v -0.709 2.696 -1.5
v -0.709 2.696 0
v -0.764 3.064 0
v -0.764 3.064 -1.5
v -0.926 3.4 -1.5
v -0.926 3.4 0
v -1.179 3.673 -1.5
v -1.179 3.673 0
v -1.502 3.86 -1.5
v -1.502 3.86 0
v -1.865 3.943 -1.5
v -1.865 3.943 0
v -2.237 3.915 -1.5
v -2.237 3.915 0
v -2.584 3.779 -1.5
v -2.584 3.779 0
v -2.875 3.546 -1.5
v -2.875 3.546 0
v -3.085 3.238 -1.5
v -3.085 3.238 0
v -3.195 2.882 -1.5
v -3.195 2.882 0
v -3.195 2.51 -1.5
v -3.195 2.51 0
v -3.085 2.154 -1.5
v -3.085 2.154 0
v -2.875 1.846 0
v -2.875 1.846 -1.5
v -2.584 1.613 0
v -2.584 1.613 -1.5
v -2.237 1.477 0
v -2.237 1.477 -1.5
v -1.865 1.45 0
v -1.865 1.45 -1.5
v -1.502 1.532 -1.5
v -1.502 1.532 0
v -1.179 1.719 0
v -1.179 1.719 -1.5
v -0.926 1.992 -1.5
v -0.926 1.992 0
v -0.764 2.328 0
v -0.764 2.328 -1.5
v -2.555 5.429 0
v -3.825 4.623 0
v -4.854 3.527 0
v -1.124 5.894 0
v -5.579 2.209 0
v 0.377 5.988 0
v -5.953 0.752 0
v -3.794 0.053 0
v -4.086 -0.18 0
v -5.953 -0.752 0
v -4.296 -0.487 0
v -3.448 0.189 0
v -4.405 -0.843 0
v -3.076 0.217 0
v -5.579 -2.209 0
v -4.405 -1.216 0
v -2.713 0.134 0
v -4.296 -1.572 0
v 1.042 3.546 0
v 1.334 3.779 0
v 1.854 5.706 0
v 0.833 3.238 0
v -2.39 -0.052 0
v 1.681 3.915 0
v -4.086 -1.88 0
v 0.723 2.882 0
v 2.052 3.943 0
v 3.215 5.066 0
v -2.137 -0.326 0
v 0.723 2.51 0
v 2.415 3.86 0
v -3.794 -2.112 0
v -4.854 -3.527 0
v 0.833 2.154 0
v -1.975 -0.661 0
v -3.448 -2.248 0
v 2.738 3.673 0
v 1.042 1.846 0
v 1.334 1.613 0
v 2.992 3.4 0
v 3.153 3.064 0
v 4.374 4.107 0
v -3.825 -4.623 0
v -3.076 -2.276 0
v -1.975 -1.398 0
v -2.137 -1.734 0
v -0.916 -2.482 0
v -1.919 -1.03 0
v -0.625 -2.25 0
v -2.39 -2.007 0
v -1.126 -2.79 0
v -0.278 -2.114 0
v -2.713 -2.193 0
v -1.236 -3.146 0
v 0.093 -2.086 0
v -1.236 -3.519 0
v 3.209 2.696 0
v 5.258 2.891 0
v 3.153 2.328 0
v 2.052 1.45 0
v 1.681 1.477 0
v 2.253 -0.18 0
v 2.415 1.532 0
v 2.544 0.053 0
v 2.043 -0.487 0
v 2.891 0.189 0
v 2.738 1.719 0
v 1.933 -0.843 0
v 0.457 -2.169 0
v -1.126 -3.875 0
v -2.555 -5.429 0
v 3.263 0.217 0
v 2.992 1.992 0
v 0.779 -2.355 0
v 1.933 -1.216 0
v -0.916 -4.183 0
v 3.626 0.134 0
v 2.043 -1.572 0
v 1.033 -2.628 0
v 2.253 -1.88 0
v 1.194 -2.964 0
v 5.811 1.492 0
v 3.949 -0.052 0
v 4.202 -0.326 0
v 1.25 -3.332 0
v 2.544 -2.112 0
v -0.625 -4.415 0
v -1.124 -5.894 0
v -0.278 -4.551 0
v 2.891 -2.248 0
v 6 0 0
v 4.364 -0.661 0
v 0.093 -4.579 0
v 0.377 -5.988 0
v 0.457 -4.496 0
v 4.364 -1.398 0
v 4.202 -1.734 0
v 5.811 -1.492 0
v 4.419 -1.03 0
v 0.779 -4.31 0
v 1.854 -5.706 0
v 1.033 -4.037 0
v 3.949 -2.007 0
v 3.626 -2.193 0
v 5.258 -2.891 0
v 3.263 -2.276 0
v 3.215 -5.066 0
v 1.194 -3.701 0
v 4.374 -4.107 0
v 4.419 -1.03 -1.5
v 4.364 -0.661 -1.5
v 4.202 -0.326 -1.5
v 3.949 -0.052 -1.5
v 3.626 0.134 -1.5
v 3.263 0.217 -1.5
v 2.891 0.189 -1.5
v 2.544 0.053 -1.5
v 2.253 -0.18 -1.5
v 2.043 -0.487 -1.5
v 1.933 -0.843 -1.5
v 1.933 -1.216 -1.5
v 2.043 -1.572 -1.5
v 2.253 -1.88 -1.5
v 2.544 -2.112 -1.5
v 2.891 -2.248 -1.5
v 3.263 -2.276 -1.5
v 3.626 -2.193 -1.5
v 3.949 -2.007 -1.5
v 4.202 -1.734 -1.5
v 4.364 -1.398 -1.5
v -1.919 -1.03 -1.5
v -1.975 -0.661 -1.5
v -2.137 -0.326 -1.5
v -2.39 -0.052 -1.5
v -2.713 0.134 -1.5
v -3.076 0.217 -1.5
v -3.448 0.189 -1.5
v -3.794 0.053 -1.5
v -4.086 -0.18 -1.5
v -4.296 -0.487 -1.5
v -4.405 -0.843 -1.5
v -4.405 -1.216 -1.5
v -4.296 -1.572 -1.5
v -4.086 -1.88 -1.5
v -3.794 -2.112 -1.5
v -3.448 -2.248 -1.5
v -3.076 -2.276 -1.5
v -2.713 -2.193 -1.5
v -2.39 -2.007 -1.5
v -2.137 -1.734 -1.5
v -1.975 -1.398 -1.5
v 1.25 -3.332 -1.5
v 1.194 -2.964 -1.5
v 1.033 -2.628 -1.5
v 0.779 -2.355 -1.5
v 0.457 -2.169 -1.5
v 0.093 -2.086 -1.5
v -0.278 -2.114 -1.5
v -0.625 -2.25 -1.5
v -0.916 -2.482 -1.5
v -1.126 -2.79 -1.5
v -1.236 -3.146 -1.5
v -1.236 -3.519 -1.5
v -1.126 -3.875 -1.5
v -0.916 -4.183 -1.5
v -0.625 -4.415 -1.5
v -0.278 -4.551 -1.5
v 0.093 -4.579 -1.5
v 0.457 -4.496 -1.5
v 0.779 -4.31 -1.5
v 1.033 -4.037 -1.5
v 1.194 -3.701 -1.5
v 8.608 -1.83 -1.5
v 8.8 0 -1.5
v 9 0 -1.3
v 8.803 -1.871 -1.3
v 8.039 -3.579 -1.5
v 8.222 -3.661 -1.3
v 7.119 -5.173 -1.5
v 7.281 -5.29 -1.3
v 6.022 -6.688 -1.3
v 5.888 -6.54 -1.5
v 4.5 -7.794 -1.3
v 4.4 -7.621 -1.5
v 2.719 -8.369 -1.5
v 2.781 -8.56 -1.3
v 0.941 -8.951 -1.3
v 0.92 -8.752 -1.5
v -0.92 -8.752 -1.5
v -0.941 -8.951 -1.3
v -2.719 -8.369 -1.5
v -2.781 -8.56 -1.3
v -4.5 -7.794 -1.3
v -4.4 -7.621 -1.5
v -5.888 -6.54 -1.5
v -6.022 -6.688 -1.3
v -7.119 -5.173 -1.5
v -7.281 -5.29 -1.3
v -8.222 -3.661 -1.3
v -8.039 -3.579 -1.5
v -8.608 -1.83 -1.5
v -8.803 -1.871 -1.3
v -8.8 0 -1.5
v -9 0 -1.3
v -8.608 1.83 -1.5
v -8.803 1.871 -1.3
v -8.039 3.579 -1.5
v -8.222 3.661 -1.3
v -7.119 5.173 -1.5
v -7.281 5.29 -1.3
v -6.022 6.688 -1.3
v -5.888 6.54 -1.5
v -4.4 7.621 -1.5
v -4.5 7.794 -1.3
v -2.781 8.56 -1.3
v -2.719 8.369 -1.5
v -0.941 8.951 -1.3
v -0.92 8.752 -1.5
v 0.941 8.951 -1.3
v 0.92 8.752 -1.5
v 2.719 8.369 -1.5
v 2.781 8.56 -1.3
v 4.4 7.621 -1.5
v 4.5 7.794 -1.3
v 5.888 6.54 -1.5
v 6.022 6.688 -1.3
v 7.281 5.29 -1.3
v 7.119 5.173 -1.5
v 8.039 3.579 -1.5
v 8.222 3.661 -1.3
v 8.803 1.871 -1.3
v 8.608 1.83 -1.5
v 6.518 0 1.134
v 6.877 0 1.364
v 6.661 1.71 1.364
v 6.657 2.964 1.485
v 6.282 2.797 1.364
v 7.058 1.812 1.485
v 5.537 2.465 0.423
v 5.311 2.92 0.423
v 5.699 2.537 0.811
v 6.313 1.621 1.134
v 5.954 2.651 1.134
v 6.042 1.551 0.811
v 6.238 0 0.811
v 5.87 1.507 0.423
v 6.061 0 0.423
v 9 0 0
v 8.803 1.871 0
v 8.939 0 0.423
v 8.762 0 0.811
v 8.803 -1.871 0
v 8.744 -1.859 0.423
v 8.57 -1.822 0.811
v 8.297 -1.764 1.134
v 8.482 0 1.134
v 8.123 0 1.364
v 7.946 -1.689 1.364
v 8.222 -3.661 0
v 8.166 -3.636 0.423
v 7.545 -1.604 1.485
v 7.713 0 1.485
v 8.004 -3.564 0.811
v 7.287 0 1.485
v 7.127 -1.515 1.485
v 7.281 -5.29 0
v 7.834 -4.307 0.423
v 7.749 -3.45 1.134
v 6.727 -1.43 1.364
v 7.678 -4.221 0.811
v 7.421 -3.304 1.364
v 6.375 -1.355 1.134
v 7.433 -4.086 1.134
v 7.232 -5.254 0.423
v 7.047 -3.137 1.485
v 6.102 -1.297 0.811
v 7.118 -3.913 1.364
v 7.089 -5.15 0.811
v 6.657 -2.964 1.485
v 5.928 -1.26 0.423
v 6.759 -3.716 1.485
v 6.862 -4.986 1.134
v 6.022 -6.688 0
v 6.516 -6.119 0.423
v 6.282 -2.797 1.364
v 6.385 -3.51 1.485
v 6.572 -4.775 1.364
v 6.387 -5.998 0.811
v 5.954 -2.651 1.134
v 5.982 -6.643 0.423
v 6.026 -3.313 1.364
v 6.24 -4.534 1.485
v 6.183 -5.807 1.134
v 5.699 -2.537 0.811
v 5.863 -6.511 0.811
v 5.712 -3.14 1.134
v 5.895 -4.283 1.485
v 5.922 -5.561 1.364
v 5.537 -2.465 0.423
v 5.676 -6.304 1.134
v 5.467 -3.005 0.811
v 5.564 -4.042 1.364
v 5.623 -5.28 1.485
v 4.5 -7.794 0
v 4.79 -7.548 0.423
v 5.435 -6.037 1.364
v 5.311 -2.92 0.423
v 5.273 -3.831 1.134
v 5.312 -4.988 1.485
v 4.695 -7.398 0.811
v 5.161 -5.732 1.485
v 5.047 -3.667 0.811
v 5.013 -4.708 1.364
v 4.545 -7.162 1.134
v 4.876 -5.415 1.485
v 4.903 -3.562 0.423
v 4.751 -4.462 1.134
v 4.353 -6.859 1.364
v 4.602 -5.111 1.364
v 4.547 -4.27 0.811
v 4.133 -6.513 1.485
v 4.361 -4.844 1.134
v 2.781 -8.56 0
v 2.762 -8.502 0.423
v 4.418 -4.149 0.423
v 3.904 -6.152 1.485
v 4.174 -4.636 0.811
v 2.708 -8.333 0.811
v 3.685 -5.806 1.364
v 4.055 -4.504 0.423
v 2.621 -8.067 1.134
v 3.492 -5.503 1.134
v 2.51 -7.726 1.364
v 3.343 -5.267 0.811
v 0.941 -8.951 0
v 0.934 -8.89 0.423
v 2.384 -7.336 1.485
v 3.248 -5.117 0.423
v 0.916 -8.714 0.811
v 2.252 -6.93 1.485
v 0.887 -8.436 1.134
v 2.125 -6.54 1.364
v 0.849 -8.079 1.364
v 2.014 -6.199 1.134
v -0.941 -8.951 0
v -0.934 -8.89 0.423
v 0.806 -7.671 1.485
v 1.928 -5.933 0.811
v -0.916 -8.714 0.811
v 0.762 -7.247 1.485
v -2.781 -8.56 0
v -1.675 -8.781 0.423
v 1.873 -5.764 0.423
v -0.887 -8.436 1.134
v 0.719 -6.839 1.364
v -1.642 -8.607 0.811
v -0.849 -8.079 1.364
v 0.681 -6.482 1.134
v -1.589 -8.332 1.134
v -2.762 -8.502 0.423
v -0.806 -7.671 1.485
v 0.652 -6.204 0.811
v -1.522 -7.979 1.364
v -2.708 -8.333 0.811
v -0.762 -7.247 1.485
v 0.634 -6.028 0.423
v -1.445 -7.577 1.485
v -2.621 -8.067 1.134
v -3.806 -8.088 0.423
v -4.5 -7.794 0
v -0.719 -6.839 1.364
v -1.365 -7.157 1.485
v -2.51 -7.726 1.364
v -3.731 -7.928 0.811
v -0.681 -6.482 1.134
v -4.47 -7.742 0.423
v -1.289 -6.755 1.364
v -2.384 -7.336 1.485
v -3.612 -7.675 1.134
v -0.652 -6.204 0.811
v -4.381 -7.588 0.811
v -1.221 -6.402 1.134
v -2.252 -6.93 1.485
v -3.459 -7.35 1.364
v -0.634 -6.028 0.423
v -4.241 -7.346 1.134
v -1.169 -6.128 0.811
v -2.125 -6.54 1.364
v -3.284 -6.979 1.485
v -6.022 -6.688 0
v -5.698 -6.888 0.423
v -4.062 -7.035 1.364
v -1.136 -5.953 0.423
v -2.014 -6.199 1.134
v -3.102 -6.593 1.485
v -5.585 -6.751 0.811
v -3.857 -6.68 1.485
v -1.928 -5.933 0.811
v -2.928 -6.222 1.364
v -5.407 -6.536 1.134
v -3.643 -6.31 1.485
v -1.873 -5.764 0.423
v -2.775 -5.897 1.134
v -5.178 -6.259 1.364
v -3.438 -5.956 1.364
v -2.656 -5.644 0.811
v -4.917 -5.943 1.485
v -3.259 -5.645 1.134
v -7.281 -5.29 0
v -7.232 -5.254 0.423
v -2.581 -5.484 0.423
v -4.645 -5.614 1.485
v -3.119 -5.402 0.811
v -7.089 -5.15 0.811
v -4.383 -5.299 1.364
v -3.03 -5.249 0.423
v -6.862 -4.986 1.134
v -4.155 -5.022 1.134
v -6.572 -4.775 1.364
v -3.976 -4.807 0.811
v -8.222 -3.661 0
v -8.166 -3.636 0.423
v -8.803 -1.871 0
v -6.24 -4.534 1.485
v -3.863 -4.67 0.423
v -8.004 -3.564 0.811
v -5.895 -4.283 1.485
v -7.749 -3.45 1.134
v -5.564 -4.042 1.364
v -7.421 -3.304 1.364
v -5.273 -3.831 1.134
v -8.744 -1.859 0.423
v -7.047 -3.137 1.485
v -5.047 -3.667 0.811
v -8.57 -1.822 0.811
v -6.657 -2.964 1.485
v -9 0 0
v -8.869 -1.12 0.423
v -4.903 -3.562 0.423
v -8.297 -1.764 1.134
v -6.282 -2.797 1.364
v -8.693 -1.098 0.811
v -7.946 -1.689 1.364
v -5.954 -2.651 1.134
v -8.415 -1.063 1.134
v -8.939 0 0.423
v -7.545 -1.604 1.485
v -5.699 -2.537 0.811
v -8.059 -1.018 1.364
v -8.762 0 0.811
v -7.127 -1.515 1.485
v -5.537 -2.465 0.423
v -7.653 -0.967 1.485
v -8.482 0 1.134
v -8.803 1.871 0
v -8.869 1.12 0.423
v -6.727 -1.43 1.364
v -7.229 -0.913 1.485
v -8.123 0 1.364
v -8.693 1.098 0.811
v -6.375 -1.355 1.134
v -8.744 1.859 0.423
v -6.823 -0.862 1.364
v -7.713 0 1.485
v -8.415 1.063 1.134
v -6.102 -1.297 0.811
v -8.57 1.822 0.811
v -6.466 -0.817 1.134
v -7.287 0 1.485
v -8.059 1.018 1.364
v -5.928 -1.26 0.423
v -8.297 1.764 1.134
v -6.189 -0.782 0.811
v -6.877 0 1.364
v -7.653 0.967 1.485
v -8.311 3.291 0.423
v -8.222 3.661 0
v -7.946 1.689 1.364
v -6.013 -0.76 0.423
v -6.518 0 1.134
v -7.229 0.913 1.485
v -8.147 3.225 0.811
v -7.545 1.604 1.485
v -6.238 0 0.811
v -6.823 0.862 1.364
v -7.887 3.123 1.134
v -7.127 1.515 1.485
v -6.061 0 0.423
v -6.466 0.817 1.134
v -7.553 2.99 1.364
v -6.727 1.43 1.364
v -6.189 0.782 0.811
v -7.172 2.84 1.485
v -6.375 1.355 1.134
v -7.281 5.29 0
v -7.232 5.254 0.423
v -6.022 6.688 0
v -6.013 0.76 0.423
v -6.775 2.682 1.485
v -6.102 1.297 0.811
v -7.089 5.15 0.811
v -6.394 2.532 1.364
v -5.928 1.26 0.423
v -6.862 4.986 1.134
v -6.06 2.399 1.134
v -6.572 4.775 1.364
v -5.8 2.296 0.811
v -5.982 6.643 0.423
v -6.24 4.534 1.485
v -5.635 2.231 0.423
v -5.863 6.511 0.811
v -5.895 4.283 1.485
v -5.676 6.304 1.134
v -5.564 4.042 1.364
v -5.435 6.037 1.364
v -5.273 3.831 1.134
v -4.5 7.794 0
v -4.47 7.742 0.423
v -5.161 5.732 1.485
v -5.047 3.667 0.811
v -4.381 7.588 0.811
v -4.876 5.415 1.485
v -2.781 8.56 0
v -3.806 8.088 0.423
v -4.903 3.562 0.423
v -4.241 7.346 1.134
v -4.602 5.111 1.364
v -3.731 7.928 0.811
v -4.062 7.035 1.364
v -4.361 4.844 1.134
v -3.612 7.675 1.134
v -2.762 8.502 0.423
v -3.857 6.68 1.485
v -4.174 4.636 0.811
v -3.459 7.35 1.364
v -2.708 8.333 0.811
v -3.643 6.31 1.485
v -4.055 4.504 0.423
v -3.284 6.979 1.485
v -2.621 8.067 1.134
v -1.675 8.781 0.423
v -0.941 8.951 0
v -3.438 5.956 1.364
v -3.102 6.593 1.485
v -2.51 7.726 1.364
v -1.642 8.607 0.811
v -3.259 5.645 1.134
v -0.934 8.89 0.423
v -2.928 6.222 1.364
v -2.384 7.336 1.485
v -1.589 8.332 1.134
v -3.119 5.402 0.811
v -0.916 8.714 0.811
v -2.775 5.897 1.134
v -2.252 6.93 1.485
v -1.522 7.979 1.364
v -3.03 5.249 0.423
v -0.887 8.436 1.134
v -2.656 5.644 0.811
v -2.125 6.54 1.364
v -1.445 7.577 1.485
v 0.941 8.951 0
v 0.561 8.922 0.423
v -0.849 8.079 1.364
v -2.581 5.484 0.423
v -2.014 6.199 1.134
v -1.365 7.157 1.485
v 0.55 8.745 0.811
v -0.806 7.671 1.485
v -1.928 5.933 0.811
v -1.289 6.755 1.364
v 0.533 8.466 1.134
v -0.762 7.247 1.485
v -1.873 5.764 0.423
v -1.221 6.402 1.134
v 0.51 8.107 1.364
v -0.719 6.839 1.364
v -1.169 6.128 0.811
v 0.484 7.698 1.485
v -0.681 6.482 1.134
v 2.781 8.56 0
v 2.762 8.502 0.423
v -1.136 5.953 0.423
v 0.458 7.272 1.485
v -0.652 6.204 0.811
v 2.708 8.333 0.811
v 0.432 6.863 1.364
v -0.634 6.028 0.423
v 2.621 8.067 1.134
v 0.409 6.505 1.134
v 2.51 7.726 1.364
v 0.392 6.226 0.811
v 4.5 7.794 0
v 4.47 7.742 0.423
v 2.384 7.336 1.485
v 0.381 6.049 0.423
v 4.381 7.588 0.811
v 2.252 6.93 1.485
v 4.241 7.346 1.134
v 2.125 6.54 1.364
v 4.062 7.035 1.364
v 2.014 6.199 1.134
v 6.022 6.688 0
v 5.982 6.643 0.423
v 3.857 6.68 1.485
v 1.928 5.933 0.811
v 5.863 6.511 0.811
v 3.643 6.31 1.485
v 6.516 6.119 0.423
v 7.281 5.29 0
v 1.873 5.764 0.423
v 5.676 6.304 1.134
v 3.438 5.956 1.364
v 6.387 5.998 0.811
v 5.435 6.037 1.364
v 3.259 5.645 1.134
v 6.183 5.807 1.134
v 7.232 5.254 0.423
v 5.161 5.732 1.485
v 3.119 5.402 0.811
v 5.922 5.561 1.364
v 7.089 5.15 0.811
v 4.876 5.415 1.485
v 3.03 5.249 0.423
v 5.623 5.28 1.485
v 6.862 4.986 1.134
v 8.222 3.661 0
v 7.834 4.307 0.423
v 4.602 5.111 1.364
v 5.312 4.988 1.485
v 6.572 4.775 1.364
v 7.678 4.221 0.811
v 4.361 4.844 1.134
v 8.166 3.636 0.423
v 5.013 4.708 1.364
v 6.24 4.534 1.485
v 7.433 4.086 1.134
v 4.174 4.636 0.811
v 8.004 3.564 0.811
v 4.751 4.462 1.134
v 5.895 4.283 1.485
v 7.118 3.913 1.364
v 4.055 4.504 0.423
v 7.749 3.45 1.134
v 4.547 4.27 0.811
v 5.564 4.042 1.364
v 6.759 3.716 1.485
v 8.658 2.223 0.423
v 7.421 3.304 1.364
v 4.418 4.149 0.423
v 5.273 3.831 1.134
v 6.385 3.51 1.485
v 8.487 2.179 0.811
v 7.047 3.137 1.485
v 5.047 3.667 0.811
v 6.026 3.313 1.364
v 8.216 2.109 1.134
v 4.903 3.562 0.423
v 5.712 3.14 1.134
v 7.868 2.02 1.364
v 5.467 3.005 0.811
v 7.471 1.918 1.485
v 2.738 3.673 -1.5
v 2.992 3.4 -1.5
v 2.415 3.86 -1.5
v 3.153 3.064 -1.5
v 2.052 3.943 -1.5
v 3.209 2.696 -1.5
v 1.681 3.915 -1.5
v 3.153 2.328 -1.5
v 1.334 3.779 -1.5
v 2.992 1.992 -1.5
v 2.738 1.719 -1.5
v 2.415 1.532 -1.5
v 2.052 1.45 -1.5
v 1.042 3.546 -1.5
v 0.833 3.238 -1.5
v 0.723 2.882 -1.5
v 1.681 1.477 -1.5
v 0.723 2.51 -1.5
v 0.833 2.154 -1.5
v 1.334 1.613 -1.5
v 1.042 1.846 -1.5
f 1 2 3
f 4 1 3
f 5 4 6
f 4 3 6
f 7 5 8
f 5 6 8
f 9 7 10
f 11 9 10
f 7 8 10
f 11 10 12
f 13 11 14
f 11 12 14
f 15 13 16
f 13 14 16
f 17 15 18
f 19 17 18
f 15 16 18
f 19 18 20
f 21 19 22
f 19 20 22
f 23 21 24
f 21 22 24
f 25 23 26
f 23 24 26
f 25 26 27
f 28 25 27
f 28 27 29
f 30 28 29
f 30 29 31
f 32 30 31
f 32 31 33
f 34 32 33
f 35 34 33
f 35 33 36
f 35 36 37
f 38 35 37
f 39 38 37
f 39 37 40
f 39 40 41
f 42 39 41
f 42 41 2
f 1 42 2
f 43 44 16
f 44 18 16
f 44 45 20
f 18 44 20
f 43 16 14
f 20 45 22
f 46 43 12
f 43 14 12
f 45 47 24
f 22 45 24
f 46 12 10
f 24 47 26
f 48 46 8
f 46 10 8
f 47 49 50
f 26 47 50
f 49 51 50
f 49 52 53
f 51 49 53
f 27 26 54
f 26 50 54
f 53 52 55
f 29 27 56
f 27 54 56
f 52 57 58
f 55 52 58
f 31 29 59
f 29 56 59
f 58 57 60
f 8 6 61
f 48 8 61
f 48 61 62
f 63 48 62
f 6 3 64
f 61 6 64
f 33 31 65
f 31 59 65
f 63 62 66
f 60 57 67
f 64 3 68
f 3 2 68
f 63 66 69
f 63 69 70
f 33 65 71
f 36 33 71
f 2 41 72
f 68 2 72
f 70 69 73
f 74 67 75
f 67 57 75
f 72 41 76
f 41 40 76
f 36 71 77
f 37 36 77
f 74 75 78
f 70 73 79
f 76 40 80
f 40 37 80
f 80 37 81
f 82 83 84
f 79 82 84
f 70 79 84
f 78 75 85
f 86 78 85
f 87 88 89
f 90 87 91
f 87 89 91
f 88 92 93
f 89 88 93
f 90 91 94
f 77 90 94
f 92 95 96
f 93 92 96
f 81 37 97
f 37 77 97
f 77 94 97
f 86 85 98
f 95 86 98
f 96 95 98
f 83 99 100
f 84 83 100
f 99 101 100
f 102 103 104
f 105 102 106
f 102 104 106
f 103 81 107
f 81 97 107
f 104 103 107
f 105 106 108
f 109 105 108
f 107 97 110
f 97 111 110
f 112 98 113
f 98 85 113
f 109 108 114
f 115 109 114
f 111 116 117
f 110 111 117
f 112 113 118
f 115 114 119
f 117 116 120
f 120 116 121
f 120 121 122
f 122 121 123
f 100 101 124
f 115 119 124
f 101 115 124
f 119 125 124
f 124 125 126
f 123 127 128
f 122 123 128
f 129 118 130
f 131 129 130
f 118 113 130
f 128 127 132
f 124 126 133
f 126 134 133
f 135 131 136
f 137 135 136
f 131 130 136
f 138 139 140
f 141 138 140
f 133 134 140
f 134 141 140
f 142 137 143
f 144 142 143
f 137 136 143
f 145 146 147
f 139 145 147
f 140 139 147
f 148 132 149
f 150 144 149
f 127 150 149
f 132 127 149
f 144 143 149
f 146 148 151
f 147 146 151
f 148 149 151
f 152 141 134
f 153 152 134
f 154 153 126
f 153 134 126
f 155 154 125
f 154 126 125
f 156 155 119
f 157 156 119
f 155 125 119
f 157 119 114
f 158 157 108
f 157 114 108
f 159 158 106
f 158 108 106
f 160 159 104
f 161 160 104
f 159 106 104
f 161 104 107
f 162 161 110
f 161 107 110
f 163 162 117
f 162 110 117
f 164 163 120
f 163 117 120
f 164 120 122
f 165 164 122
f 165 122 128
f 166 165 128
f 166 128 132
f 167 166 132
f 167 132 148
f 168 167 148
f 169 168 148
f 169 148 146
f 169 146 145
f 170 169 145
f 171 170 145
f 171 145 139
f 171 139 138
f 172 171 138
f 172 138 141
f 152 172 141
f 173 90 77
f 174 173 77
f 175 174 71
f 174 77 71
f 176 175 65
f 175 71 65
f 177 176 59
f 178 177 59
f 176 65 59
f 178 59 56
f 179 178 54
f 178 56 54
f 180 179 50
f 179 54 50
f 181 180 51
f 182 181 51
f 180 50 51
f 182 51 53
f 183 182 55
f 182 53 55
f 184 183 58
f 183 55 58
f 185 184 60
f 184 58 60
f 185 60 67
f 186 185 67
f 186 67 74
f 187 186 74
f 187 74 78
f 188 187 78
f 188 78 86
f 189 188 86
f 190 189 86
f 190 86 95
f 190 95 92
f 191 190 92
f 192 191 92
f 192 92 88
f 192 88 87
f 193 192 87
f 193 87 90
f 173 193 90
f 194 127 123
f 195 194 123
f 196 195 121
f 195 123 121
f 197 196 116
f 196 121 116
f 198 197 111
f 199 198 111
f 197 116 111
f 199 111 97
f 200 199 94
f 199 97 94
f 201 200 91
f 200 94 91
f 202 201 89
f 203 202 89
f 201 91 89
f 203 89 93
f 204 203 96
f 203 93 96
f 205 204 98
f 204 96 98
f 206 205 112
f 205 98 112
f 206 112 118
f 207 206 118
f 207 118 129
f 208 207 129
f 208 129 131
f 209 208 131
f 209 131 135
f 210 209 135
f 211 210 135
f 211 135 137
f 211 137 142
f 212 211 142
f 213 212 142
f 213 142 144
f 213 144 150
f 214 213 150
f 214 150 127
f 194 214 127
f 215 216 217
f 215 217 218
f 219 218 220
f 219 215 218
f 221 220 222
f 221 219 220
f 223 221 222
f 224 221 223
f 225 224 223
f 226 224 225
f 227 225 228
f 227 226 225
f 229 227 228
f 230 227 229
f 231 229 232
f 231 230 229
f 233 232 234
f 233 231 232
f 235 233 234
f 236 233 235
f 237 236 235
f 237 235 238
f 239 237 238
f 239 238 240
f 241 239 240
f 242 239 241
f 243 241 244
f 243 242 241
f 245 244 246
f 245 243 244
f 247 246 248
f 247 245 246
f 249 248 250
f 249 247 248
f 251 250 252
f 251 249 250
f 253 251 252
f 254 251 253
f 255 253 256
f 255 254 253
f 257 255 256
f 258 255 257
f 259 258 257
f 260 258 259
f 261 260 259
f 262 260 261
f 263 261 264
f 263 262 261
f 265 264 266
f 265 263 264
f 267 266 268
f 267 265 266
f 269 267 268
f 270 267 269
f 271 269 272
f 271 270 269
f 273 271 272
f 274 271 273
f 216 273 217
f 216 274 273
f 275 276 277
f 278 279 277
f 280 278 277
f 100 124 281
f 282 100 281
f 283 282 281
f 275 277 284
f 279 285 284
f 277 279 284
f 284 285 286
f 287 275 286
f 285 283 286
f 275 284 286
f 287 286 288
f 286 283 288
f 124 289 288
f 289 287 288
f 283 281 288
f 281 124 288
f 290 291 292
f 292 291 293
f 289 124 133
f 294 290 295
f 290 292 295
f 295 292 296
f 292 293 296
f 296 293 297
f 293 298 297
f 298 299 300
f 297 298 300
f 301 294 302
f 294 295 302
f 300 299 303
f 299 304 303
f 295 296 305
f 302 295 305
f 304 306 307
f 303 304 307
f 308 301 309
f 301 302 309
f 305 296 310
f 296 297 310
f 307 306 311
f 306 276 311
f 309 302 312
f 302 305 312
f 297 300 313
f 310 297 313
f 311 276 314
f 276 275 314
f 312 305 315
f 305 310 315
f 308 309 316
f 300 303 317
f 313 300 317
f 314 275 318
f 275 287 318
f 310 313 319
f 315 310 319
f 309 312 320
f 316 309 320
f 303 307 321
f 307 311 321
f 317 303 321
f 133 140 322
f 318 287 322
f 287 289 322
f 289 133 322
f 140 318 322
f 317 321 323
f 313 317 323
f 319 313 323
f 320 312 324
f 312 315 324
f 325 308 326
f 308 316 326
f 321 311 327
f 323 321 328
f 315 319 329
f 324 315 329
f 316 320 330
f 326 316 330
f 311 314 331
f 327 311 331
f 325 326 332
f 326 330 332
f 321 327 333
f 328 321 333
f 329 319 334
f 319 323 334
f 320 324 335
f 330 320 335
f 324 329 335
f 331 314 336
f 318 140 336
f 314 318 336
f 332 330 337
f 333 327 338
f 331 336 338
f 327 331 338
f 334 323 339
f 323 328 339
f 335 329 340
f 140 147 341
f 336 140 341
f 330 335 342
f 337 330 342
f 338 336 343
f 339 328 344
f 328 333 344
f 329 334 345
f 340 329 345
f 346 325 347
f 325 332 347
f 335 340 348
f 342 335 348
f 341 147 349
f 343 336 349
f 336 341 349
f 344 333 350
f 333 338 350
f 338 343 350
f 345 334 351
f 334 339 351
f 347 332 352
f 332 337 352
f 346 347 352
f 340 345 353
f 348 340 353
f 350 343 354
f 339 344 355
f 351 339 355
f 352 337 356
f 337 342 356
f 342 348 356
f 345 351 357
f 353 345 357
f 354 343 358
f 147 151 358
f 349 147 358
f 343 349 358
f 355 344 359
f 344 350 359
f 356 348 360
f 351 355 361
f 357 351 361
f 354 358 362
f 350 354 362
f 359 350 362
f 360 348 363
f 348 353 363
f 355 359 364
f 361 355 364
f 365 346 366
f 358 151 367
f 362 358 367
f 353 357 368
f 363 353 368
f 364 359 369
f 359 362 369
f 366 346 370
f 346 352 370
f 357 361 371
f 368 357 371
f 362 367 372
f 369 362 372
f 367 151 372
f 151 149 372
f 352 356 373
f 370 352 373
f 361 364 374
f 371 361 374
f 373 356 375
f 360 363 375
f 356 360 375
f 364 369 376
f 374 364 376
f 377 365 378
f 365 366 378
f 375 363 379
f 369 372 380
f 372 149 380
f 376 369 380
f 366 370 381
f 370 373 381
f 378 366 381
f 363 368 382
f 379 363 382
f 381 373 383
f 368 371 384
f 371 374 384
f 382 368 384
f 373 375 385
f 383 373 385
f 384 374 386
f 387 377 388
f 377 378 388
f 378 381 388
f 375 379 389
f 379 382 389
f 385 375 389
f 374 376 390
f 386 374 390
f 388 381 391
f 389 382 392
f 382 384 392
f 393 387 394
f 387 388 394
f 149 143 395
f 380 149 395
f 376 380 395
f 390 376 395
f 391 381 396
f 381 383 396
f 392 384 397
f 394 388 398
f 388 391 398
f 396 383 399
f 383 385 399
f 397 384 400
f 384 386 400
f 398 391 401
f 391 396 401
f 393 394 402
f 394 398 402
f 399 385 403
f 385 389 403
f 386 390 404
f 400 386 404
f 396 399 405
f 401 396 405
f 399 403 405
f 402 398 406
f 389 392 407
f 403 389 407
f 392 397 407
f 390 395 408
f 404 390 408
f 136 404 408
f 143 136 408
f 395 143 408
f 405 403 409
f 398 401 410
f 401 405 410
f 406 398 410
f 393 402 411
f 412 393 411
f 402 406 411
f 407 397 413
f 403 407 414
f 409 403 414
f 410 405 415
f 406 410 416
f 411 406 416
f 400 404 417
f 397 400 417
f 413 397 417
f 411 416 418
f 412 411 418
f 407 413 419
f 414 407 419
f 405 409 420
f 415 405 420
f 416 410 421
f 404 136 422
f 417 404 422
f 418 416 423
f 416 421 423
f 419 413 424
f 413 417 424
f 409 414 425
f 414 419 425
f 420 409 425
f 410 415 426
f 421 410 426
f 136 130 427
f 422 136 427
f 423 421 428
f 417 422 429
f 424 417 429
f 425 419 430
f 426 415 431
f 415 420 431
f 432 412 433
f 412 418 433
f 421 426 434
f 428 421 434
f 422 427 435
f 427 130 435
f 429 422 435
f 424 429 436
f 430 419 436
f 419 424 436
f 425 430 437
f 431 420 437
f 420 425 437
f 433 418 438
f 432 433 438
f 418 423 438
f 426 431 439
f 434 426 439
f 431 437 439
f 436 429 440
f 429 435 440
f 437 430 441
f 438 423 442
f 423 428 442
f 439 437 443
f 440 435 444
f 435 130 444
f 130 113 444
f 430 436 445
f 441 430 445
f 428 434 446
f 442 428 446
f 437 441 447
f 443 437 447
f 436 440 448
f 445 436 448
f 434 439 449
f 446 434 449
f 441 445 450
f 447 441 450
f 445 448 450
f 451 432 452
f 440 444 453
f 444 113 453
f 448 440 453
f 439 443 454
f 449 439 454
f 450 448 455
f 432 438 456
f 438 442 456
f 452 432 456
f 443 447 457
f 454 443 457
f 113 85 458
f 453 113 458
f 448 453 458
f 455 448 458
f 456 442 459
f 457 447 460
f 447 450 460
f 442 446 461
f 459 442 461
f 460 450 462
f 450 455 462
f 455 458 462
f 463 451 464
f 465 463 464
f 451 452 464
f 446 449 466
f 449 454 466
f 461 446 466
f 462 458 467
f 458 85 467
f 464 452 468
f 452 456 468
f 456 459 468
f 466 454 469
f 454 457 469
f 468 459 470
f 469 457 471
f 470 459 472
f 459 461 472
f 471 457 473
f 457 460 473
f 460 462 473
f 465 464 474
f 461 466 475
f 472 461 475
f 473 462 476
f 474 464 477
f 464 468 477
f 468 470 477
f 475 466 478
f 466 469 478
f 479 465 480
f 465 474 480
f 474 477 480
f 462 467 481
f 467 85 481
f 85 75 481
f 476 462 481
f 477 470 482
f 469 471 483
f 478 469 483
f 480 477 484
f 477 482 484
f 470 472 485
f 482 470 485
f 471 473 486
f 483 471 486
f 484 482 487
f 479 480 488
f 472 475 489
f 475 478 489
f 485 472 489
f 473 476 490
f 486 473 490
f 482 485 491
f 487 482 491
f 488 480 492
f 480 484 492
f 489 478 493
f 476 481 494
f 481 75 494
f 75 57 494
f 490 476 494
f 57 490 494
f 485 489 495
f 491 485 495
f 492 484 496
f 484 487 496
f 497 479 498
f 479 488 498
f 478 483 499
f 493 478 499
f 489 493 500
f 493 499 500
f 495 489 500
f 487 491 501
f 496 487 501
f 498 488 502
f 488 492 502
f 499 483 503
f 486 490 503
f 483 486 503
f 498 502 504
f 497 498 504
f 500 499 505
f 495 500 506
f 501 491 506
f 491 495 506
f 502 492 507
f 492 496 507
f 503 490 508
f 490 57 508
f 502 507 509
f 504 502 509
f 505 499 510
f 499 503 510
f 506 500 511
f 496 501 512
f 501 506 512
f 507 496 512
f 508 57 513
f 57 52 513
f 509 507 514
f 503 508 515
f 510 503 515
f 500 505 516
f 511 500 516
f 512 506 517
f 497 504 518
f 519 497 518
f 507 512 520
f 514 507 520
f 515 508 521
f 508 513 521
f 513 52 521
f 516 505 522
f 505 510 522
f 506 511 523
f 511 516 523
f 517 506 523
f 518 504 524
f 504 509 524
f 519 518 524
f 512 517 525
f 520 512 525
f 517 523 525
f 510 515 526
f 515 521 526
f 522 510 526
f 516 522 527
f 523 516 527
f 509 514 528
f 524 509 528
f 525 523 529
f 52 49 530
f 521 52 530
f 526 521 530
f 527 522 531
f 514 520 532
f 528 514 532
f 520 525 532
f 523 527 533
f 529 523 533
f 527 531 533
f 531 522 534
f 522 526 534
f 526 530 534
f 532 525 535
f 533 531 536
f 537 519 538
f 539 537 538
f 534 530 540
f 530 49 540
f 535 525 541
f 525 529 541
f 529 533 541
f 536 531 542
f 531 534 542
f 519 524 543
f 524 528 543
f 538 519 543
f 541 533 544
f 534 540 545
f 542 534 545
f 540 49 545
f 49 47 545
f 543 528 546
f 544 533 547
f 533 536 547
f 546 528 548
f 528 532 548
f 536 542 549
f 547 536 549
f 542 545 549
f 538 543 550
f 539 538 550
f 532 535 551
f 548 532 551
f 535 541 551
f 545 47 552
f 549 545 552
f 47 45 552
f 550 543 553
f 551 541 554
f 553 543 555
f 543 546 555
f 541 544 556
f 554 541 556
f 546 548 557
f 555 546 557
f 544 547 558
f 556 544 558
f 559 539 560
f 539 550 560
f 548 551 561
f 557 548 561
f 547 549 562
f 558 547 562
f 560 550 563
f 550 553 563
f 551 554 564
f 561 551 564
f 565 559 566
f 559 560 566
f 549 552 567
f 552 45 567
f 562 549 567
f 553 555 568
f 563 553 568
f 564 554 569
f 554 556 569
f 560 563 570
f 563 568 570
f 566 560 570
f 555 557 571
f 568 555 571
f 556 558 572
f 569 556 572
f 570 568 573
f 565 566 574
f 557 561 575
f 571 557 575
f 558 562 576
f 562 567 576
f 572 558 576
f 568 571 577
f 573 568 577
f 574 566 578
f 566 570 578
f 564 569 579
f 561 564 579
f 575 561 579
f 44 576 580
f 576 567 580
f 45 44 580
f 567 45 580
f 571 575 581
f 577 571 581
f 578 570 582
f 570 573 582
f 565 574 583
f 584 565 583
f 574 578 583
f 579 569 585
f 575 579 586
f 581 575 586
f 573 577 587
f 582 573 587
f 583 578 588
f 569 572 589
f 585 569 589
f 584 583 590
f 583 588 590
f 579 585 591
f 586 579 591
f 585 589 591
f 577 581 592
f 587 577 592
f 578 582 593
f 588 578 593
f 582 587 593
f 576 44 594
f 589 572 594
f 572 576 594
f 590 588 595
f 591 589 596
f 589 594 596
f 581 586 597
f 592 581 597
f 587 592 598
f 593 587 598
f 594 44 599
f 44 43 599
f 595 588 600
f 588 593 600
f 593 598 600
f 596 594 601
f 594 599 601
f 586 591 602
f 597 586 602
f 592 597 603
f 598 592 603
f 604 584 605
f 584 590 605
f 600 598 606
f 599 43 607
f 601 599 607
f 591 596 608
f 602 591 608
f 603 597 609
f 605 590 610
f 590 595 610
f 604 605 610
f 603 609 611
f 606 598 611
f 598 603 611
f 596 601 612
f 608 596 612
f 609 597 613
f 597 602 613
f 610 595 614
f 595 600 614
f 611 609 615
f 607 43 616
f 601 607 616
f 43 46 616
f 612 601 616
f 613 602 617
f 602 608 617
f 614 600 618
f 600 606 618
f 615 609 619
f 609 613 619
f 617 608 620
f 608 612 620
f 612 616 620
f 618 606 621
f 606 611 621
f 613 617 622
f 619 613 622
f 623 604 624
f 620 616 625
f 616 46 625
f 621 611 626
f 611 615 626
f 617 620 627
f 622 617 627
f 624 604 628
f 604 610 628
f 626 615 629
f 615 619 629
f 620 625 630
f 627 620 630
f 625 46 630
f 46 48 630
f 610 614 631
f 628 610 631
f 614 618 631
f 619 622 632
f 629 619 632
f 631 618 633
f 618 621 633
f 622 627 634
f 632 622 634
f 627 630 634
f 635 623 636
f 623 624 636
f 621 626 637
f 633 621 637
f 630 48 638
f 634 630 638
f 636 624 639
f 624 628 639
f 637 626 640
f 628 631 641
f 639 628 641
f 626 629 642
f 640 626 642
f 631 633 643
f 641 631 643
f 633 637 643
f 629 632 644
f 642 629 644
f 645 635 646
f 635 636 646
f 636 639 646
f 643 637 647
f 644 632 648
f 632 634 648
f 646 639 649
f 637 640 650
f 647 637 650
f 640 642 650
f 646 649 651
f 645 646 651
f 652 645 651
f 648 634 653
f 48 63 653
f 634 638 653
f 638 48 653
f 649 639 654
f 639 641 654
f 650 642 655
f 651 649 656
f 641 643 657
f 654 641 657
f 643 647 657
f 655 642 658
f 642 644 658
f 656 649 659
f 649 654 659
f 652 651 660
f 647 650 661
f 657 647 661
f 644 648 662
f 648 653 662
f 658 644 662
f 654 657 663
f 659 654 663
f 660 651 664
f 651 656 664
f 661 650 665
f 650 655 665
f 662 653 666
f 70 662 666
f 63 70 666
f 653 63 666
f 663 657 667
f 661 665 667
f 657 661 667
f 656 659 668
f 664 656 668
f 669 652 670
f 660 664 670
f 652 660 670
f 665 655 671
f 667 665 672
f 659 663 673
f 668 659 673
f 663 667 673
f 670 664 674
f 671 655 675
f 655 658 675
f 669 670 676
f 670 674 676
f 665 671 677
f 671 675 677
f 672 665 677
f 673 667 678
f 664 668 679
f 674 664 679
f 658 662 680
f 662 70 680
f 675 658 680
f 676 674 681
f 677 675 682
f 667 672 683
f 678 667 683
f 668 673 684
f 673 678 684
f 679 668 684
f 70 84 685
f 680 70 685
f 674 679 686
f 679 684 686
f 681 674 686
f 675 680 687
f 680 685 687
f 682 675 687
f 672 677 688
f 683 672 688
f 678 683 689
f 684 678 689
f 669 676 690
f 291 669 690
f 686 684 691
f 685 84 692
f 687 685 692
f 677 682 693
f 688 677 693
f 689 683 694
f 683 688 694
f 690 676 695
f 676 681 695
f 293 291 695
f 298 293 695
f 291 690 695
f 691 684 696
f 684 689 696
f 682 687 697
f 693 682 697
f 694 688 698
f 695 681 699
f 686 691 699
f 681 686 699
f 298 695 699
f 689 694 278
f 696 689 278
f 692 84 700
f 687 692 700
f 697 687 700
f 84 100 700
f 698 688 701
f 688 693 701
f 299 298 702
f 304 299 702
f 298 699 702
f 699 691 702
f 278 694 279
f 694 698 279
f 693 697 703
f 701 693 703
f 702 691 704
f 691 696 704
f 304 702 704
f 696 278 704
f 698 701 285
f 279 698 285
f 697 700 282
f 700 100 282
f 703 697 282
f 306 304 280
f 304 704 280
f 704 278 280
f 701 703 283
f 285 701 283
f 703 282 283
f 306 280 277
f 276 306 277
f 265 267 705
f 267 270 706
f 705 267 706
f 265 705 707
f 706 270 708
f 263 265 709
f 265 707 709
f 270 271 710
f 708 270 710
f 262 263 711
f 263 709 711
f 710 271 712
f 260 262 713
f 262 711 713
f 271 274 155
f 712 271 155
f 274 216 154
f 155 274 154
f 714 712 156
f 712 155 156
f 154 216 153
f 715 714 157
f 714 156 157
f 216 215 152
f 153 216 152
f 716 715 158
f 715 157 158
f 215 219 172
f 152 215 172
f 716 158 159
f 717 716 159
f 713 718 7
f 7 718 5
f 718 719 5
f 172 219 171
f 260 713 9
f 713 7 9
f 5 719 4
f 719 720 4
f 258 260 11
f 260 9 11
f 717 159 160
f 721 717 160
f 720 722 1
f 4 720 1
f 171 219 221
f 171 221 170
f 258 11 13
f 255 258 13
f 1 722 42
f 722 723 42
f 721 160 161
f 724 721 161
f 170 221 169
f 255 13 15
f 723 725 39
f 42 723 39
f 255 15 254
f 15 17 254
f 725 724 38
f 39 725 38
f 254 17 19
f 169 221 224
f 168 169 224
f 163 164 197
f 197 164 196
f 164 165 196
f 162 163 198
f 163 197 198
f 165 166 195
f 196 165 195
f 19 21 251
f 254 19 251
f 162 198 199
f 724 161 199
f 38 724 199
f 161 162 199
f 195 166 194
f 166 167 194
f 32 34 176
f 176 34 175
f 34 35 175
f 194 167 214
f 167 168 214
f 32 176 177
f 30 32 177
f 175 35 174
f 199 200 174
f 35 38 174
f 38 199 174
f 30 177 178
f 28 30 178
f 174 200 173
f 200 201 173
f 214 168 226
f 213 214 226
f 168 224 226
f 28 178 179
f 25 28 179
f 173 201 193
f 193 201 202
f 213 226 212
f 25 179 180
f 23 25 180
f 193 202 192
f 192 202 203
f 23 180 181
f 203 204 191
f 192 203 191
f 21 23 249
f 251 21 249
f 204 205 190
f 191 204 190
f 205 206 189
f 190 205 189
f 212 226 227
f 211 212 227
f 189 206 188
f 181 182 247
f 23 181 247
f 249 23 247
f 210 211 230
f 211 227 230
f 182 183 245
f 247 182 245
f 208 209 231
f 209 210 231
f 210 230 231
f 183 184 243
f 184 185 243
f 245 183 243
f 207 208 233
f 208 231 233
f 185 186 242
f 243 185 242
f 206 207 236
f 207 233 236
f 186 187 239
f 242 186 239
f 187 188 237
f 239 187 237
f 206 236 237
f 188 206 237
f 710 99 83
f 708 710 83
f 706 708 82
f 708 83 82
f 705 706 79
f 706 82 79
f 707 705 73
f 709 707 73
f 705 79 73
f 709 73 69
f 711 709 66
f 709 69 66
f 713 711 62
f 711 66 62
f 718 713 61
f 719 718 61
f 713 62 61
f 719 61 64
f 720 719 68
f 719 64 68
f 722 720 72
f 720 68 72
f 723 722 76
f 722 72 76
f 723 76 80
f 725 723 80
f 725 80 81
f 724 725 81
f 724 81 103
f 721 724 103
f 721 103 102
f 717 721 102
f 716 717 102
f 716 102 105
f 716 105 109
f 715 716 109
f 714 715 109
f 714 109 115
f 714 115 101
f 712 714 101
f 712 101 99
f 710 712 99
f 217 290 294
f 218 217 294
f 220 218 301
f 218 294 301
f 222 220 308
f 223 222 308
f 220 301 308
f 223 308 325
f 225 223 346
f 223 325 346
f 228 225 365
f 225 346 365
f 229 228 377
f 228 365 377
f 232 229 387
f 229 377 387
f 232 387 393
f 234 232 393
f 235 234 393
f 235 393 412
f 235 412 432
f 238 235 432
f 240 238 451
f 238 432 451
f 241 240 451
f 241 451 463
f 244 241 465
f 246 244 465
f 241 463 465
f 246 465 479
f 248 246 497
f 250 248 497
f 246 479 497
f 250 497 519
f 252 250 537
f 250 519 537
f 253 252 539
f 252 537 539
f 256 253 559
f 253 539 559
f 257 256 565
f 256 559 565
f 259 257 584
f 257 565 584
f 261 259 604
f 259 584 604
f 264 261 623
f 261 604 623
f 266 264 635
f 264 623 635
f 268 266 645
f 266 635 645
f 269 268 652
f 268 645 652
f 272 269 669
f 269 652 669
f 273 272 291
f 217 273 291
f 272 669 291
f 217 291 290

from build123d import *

# Parameters (mm, degrees)
F2_SIZE  = 0.2
F3_R     = 1.25
F4_DEPTH = 1.501


with BuildPart() as f1:
    # F0 (on Front) → F1 (revolve)
    with BuildSketch(Plane.XZ):
        with BuildLine():
            Line((7.5, -1.5), (9, -1.5))
            Line((9, -1.5), (9, 0))
            ThreePointArc((9, 0), (8.56066, -1.06066), (7.5, -1.5))
        make_face()
        with BuildLine():
            Line((0, -1.5), (7.5, -1.5))
            ThreePointArc((7.5, -1.5), (6.43934, -1.06066), (6, 0))
            Line((6, 0), (0, 0))
            Line((0, 0), (0, -1.5))
        make_face()
        with BuildLine():
            ThreePointArc((6, 0), (6.43934, -1.06066), (7.5, -1.5))
            ThreePointArc((7.5, -1.5), (8.56066, -1.06066), (9, 0))
            ThreePointArc((9, 0), (7.5, 1.5), (6, 0))
        make_face()
    revolve(axis=Axis((0, 0, 0), (0, 0, -1)))

    # F2
    f2_edges = [f1.edges().sort_by_distance(p)[0] for p in [
        (-9, 0, -1.5),
    ]]
    chamfer(f2_edges, length=F2_SIZE)

    # F3 (on face) → F4 (cut, through all)
    with BuildSketch(Plane.XY):
        with Locations((-1.95877, 2.696016)):
            Circle(F3_R)
        with Locations((1.95877, 2.696016)):
            Circle(F3_R)
        with Locations((3.169357, -1.029787)):
            Circle(F3_R)
        with Locations((0, -3.332459)):
            Circle(F3_R)
        with Locations((-3.169357, -1.029787)):
            Circle(F3_R)
    extrude(amount=-F4_DEPTH, mode=Mode.SUBTRACT)


solid = f1.part
